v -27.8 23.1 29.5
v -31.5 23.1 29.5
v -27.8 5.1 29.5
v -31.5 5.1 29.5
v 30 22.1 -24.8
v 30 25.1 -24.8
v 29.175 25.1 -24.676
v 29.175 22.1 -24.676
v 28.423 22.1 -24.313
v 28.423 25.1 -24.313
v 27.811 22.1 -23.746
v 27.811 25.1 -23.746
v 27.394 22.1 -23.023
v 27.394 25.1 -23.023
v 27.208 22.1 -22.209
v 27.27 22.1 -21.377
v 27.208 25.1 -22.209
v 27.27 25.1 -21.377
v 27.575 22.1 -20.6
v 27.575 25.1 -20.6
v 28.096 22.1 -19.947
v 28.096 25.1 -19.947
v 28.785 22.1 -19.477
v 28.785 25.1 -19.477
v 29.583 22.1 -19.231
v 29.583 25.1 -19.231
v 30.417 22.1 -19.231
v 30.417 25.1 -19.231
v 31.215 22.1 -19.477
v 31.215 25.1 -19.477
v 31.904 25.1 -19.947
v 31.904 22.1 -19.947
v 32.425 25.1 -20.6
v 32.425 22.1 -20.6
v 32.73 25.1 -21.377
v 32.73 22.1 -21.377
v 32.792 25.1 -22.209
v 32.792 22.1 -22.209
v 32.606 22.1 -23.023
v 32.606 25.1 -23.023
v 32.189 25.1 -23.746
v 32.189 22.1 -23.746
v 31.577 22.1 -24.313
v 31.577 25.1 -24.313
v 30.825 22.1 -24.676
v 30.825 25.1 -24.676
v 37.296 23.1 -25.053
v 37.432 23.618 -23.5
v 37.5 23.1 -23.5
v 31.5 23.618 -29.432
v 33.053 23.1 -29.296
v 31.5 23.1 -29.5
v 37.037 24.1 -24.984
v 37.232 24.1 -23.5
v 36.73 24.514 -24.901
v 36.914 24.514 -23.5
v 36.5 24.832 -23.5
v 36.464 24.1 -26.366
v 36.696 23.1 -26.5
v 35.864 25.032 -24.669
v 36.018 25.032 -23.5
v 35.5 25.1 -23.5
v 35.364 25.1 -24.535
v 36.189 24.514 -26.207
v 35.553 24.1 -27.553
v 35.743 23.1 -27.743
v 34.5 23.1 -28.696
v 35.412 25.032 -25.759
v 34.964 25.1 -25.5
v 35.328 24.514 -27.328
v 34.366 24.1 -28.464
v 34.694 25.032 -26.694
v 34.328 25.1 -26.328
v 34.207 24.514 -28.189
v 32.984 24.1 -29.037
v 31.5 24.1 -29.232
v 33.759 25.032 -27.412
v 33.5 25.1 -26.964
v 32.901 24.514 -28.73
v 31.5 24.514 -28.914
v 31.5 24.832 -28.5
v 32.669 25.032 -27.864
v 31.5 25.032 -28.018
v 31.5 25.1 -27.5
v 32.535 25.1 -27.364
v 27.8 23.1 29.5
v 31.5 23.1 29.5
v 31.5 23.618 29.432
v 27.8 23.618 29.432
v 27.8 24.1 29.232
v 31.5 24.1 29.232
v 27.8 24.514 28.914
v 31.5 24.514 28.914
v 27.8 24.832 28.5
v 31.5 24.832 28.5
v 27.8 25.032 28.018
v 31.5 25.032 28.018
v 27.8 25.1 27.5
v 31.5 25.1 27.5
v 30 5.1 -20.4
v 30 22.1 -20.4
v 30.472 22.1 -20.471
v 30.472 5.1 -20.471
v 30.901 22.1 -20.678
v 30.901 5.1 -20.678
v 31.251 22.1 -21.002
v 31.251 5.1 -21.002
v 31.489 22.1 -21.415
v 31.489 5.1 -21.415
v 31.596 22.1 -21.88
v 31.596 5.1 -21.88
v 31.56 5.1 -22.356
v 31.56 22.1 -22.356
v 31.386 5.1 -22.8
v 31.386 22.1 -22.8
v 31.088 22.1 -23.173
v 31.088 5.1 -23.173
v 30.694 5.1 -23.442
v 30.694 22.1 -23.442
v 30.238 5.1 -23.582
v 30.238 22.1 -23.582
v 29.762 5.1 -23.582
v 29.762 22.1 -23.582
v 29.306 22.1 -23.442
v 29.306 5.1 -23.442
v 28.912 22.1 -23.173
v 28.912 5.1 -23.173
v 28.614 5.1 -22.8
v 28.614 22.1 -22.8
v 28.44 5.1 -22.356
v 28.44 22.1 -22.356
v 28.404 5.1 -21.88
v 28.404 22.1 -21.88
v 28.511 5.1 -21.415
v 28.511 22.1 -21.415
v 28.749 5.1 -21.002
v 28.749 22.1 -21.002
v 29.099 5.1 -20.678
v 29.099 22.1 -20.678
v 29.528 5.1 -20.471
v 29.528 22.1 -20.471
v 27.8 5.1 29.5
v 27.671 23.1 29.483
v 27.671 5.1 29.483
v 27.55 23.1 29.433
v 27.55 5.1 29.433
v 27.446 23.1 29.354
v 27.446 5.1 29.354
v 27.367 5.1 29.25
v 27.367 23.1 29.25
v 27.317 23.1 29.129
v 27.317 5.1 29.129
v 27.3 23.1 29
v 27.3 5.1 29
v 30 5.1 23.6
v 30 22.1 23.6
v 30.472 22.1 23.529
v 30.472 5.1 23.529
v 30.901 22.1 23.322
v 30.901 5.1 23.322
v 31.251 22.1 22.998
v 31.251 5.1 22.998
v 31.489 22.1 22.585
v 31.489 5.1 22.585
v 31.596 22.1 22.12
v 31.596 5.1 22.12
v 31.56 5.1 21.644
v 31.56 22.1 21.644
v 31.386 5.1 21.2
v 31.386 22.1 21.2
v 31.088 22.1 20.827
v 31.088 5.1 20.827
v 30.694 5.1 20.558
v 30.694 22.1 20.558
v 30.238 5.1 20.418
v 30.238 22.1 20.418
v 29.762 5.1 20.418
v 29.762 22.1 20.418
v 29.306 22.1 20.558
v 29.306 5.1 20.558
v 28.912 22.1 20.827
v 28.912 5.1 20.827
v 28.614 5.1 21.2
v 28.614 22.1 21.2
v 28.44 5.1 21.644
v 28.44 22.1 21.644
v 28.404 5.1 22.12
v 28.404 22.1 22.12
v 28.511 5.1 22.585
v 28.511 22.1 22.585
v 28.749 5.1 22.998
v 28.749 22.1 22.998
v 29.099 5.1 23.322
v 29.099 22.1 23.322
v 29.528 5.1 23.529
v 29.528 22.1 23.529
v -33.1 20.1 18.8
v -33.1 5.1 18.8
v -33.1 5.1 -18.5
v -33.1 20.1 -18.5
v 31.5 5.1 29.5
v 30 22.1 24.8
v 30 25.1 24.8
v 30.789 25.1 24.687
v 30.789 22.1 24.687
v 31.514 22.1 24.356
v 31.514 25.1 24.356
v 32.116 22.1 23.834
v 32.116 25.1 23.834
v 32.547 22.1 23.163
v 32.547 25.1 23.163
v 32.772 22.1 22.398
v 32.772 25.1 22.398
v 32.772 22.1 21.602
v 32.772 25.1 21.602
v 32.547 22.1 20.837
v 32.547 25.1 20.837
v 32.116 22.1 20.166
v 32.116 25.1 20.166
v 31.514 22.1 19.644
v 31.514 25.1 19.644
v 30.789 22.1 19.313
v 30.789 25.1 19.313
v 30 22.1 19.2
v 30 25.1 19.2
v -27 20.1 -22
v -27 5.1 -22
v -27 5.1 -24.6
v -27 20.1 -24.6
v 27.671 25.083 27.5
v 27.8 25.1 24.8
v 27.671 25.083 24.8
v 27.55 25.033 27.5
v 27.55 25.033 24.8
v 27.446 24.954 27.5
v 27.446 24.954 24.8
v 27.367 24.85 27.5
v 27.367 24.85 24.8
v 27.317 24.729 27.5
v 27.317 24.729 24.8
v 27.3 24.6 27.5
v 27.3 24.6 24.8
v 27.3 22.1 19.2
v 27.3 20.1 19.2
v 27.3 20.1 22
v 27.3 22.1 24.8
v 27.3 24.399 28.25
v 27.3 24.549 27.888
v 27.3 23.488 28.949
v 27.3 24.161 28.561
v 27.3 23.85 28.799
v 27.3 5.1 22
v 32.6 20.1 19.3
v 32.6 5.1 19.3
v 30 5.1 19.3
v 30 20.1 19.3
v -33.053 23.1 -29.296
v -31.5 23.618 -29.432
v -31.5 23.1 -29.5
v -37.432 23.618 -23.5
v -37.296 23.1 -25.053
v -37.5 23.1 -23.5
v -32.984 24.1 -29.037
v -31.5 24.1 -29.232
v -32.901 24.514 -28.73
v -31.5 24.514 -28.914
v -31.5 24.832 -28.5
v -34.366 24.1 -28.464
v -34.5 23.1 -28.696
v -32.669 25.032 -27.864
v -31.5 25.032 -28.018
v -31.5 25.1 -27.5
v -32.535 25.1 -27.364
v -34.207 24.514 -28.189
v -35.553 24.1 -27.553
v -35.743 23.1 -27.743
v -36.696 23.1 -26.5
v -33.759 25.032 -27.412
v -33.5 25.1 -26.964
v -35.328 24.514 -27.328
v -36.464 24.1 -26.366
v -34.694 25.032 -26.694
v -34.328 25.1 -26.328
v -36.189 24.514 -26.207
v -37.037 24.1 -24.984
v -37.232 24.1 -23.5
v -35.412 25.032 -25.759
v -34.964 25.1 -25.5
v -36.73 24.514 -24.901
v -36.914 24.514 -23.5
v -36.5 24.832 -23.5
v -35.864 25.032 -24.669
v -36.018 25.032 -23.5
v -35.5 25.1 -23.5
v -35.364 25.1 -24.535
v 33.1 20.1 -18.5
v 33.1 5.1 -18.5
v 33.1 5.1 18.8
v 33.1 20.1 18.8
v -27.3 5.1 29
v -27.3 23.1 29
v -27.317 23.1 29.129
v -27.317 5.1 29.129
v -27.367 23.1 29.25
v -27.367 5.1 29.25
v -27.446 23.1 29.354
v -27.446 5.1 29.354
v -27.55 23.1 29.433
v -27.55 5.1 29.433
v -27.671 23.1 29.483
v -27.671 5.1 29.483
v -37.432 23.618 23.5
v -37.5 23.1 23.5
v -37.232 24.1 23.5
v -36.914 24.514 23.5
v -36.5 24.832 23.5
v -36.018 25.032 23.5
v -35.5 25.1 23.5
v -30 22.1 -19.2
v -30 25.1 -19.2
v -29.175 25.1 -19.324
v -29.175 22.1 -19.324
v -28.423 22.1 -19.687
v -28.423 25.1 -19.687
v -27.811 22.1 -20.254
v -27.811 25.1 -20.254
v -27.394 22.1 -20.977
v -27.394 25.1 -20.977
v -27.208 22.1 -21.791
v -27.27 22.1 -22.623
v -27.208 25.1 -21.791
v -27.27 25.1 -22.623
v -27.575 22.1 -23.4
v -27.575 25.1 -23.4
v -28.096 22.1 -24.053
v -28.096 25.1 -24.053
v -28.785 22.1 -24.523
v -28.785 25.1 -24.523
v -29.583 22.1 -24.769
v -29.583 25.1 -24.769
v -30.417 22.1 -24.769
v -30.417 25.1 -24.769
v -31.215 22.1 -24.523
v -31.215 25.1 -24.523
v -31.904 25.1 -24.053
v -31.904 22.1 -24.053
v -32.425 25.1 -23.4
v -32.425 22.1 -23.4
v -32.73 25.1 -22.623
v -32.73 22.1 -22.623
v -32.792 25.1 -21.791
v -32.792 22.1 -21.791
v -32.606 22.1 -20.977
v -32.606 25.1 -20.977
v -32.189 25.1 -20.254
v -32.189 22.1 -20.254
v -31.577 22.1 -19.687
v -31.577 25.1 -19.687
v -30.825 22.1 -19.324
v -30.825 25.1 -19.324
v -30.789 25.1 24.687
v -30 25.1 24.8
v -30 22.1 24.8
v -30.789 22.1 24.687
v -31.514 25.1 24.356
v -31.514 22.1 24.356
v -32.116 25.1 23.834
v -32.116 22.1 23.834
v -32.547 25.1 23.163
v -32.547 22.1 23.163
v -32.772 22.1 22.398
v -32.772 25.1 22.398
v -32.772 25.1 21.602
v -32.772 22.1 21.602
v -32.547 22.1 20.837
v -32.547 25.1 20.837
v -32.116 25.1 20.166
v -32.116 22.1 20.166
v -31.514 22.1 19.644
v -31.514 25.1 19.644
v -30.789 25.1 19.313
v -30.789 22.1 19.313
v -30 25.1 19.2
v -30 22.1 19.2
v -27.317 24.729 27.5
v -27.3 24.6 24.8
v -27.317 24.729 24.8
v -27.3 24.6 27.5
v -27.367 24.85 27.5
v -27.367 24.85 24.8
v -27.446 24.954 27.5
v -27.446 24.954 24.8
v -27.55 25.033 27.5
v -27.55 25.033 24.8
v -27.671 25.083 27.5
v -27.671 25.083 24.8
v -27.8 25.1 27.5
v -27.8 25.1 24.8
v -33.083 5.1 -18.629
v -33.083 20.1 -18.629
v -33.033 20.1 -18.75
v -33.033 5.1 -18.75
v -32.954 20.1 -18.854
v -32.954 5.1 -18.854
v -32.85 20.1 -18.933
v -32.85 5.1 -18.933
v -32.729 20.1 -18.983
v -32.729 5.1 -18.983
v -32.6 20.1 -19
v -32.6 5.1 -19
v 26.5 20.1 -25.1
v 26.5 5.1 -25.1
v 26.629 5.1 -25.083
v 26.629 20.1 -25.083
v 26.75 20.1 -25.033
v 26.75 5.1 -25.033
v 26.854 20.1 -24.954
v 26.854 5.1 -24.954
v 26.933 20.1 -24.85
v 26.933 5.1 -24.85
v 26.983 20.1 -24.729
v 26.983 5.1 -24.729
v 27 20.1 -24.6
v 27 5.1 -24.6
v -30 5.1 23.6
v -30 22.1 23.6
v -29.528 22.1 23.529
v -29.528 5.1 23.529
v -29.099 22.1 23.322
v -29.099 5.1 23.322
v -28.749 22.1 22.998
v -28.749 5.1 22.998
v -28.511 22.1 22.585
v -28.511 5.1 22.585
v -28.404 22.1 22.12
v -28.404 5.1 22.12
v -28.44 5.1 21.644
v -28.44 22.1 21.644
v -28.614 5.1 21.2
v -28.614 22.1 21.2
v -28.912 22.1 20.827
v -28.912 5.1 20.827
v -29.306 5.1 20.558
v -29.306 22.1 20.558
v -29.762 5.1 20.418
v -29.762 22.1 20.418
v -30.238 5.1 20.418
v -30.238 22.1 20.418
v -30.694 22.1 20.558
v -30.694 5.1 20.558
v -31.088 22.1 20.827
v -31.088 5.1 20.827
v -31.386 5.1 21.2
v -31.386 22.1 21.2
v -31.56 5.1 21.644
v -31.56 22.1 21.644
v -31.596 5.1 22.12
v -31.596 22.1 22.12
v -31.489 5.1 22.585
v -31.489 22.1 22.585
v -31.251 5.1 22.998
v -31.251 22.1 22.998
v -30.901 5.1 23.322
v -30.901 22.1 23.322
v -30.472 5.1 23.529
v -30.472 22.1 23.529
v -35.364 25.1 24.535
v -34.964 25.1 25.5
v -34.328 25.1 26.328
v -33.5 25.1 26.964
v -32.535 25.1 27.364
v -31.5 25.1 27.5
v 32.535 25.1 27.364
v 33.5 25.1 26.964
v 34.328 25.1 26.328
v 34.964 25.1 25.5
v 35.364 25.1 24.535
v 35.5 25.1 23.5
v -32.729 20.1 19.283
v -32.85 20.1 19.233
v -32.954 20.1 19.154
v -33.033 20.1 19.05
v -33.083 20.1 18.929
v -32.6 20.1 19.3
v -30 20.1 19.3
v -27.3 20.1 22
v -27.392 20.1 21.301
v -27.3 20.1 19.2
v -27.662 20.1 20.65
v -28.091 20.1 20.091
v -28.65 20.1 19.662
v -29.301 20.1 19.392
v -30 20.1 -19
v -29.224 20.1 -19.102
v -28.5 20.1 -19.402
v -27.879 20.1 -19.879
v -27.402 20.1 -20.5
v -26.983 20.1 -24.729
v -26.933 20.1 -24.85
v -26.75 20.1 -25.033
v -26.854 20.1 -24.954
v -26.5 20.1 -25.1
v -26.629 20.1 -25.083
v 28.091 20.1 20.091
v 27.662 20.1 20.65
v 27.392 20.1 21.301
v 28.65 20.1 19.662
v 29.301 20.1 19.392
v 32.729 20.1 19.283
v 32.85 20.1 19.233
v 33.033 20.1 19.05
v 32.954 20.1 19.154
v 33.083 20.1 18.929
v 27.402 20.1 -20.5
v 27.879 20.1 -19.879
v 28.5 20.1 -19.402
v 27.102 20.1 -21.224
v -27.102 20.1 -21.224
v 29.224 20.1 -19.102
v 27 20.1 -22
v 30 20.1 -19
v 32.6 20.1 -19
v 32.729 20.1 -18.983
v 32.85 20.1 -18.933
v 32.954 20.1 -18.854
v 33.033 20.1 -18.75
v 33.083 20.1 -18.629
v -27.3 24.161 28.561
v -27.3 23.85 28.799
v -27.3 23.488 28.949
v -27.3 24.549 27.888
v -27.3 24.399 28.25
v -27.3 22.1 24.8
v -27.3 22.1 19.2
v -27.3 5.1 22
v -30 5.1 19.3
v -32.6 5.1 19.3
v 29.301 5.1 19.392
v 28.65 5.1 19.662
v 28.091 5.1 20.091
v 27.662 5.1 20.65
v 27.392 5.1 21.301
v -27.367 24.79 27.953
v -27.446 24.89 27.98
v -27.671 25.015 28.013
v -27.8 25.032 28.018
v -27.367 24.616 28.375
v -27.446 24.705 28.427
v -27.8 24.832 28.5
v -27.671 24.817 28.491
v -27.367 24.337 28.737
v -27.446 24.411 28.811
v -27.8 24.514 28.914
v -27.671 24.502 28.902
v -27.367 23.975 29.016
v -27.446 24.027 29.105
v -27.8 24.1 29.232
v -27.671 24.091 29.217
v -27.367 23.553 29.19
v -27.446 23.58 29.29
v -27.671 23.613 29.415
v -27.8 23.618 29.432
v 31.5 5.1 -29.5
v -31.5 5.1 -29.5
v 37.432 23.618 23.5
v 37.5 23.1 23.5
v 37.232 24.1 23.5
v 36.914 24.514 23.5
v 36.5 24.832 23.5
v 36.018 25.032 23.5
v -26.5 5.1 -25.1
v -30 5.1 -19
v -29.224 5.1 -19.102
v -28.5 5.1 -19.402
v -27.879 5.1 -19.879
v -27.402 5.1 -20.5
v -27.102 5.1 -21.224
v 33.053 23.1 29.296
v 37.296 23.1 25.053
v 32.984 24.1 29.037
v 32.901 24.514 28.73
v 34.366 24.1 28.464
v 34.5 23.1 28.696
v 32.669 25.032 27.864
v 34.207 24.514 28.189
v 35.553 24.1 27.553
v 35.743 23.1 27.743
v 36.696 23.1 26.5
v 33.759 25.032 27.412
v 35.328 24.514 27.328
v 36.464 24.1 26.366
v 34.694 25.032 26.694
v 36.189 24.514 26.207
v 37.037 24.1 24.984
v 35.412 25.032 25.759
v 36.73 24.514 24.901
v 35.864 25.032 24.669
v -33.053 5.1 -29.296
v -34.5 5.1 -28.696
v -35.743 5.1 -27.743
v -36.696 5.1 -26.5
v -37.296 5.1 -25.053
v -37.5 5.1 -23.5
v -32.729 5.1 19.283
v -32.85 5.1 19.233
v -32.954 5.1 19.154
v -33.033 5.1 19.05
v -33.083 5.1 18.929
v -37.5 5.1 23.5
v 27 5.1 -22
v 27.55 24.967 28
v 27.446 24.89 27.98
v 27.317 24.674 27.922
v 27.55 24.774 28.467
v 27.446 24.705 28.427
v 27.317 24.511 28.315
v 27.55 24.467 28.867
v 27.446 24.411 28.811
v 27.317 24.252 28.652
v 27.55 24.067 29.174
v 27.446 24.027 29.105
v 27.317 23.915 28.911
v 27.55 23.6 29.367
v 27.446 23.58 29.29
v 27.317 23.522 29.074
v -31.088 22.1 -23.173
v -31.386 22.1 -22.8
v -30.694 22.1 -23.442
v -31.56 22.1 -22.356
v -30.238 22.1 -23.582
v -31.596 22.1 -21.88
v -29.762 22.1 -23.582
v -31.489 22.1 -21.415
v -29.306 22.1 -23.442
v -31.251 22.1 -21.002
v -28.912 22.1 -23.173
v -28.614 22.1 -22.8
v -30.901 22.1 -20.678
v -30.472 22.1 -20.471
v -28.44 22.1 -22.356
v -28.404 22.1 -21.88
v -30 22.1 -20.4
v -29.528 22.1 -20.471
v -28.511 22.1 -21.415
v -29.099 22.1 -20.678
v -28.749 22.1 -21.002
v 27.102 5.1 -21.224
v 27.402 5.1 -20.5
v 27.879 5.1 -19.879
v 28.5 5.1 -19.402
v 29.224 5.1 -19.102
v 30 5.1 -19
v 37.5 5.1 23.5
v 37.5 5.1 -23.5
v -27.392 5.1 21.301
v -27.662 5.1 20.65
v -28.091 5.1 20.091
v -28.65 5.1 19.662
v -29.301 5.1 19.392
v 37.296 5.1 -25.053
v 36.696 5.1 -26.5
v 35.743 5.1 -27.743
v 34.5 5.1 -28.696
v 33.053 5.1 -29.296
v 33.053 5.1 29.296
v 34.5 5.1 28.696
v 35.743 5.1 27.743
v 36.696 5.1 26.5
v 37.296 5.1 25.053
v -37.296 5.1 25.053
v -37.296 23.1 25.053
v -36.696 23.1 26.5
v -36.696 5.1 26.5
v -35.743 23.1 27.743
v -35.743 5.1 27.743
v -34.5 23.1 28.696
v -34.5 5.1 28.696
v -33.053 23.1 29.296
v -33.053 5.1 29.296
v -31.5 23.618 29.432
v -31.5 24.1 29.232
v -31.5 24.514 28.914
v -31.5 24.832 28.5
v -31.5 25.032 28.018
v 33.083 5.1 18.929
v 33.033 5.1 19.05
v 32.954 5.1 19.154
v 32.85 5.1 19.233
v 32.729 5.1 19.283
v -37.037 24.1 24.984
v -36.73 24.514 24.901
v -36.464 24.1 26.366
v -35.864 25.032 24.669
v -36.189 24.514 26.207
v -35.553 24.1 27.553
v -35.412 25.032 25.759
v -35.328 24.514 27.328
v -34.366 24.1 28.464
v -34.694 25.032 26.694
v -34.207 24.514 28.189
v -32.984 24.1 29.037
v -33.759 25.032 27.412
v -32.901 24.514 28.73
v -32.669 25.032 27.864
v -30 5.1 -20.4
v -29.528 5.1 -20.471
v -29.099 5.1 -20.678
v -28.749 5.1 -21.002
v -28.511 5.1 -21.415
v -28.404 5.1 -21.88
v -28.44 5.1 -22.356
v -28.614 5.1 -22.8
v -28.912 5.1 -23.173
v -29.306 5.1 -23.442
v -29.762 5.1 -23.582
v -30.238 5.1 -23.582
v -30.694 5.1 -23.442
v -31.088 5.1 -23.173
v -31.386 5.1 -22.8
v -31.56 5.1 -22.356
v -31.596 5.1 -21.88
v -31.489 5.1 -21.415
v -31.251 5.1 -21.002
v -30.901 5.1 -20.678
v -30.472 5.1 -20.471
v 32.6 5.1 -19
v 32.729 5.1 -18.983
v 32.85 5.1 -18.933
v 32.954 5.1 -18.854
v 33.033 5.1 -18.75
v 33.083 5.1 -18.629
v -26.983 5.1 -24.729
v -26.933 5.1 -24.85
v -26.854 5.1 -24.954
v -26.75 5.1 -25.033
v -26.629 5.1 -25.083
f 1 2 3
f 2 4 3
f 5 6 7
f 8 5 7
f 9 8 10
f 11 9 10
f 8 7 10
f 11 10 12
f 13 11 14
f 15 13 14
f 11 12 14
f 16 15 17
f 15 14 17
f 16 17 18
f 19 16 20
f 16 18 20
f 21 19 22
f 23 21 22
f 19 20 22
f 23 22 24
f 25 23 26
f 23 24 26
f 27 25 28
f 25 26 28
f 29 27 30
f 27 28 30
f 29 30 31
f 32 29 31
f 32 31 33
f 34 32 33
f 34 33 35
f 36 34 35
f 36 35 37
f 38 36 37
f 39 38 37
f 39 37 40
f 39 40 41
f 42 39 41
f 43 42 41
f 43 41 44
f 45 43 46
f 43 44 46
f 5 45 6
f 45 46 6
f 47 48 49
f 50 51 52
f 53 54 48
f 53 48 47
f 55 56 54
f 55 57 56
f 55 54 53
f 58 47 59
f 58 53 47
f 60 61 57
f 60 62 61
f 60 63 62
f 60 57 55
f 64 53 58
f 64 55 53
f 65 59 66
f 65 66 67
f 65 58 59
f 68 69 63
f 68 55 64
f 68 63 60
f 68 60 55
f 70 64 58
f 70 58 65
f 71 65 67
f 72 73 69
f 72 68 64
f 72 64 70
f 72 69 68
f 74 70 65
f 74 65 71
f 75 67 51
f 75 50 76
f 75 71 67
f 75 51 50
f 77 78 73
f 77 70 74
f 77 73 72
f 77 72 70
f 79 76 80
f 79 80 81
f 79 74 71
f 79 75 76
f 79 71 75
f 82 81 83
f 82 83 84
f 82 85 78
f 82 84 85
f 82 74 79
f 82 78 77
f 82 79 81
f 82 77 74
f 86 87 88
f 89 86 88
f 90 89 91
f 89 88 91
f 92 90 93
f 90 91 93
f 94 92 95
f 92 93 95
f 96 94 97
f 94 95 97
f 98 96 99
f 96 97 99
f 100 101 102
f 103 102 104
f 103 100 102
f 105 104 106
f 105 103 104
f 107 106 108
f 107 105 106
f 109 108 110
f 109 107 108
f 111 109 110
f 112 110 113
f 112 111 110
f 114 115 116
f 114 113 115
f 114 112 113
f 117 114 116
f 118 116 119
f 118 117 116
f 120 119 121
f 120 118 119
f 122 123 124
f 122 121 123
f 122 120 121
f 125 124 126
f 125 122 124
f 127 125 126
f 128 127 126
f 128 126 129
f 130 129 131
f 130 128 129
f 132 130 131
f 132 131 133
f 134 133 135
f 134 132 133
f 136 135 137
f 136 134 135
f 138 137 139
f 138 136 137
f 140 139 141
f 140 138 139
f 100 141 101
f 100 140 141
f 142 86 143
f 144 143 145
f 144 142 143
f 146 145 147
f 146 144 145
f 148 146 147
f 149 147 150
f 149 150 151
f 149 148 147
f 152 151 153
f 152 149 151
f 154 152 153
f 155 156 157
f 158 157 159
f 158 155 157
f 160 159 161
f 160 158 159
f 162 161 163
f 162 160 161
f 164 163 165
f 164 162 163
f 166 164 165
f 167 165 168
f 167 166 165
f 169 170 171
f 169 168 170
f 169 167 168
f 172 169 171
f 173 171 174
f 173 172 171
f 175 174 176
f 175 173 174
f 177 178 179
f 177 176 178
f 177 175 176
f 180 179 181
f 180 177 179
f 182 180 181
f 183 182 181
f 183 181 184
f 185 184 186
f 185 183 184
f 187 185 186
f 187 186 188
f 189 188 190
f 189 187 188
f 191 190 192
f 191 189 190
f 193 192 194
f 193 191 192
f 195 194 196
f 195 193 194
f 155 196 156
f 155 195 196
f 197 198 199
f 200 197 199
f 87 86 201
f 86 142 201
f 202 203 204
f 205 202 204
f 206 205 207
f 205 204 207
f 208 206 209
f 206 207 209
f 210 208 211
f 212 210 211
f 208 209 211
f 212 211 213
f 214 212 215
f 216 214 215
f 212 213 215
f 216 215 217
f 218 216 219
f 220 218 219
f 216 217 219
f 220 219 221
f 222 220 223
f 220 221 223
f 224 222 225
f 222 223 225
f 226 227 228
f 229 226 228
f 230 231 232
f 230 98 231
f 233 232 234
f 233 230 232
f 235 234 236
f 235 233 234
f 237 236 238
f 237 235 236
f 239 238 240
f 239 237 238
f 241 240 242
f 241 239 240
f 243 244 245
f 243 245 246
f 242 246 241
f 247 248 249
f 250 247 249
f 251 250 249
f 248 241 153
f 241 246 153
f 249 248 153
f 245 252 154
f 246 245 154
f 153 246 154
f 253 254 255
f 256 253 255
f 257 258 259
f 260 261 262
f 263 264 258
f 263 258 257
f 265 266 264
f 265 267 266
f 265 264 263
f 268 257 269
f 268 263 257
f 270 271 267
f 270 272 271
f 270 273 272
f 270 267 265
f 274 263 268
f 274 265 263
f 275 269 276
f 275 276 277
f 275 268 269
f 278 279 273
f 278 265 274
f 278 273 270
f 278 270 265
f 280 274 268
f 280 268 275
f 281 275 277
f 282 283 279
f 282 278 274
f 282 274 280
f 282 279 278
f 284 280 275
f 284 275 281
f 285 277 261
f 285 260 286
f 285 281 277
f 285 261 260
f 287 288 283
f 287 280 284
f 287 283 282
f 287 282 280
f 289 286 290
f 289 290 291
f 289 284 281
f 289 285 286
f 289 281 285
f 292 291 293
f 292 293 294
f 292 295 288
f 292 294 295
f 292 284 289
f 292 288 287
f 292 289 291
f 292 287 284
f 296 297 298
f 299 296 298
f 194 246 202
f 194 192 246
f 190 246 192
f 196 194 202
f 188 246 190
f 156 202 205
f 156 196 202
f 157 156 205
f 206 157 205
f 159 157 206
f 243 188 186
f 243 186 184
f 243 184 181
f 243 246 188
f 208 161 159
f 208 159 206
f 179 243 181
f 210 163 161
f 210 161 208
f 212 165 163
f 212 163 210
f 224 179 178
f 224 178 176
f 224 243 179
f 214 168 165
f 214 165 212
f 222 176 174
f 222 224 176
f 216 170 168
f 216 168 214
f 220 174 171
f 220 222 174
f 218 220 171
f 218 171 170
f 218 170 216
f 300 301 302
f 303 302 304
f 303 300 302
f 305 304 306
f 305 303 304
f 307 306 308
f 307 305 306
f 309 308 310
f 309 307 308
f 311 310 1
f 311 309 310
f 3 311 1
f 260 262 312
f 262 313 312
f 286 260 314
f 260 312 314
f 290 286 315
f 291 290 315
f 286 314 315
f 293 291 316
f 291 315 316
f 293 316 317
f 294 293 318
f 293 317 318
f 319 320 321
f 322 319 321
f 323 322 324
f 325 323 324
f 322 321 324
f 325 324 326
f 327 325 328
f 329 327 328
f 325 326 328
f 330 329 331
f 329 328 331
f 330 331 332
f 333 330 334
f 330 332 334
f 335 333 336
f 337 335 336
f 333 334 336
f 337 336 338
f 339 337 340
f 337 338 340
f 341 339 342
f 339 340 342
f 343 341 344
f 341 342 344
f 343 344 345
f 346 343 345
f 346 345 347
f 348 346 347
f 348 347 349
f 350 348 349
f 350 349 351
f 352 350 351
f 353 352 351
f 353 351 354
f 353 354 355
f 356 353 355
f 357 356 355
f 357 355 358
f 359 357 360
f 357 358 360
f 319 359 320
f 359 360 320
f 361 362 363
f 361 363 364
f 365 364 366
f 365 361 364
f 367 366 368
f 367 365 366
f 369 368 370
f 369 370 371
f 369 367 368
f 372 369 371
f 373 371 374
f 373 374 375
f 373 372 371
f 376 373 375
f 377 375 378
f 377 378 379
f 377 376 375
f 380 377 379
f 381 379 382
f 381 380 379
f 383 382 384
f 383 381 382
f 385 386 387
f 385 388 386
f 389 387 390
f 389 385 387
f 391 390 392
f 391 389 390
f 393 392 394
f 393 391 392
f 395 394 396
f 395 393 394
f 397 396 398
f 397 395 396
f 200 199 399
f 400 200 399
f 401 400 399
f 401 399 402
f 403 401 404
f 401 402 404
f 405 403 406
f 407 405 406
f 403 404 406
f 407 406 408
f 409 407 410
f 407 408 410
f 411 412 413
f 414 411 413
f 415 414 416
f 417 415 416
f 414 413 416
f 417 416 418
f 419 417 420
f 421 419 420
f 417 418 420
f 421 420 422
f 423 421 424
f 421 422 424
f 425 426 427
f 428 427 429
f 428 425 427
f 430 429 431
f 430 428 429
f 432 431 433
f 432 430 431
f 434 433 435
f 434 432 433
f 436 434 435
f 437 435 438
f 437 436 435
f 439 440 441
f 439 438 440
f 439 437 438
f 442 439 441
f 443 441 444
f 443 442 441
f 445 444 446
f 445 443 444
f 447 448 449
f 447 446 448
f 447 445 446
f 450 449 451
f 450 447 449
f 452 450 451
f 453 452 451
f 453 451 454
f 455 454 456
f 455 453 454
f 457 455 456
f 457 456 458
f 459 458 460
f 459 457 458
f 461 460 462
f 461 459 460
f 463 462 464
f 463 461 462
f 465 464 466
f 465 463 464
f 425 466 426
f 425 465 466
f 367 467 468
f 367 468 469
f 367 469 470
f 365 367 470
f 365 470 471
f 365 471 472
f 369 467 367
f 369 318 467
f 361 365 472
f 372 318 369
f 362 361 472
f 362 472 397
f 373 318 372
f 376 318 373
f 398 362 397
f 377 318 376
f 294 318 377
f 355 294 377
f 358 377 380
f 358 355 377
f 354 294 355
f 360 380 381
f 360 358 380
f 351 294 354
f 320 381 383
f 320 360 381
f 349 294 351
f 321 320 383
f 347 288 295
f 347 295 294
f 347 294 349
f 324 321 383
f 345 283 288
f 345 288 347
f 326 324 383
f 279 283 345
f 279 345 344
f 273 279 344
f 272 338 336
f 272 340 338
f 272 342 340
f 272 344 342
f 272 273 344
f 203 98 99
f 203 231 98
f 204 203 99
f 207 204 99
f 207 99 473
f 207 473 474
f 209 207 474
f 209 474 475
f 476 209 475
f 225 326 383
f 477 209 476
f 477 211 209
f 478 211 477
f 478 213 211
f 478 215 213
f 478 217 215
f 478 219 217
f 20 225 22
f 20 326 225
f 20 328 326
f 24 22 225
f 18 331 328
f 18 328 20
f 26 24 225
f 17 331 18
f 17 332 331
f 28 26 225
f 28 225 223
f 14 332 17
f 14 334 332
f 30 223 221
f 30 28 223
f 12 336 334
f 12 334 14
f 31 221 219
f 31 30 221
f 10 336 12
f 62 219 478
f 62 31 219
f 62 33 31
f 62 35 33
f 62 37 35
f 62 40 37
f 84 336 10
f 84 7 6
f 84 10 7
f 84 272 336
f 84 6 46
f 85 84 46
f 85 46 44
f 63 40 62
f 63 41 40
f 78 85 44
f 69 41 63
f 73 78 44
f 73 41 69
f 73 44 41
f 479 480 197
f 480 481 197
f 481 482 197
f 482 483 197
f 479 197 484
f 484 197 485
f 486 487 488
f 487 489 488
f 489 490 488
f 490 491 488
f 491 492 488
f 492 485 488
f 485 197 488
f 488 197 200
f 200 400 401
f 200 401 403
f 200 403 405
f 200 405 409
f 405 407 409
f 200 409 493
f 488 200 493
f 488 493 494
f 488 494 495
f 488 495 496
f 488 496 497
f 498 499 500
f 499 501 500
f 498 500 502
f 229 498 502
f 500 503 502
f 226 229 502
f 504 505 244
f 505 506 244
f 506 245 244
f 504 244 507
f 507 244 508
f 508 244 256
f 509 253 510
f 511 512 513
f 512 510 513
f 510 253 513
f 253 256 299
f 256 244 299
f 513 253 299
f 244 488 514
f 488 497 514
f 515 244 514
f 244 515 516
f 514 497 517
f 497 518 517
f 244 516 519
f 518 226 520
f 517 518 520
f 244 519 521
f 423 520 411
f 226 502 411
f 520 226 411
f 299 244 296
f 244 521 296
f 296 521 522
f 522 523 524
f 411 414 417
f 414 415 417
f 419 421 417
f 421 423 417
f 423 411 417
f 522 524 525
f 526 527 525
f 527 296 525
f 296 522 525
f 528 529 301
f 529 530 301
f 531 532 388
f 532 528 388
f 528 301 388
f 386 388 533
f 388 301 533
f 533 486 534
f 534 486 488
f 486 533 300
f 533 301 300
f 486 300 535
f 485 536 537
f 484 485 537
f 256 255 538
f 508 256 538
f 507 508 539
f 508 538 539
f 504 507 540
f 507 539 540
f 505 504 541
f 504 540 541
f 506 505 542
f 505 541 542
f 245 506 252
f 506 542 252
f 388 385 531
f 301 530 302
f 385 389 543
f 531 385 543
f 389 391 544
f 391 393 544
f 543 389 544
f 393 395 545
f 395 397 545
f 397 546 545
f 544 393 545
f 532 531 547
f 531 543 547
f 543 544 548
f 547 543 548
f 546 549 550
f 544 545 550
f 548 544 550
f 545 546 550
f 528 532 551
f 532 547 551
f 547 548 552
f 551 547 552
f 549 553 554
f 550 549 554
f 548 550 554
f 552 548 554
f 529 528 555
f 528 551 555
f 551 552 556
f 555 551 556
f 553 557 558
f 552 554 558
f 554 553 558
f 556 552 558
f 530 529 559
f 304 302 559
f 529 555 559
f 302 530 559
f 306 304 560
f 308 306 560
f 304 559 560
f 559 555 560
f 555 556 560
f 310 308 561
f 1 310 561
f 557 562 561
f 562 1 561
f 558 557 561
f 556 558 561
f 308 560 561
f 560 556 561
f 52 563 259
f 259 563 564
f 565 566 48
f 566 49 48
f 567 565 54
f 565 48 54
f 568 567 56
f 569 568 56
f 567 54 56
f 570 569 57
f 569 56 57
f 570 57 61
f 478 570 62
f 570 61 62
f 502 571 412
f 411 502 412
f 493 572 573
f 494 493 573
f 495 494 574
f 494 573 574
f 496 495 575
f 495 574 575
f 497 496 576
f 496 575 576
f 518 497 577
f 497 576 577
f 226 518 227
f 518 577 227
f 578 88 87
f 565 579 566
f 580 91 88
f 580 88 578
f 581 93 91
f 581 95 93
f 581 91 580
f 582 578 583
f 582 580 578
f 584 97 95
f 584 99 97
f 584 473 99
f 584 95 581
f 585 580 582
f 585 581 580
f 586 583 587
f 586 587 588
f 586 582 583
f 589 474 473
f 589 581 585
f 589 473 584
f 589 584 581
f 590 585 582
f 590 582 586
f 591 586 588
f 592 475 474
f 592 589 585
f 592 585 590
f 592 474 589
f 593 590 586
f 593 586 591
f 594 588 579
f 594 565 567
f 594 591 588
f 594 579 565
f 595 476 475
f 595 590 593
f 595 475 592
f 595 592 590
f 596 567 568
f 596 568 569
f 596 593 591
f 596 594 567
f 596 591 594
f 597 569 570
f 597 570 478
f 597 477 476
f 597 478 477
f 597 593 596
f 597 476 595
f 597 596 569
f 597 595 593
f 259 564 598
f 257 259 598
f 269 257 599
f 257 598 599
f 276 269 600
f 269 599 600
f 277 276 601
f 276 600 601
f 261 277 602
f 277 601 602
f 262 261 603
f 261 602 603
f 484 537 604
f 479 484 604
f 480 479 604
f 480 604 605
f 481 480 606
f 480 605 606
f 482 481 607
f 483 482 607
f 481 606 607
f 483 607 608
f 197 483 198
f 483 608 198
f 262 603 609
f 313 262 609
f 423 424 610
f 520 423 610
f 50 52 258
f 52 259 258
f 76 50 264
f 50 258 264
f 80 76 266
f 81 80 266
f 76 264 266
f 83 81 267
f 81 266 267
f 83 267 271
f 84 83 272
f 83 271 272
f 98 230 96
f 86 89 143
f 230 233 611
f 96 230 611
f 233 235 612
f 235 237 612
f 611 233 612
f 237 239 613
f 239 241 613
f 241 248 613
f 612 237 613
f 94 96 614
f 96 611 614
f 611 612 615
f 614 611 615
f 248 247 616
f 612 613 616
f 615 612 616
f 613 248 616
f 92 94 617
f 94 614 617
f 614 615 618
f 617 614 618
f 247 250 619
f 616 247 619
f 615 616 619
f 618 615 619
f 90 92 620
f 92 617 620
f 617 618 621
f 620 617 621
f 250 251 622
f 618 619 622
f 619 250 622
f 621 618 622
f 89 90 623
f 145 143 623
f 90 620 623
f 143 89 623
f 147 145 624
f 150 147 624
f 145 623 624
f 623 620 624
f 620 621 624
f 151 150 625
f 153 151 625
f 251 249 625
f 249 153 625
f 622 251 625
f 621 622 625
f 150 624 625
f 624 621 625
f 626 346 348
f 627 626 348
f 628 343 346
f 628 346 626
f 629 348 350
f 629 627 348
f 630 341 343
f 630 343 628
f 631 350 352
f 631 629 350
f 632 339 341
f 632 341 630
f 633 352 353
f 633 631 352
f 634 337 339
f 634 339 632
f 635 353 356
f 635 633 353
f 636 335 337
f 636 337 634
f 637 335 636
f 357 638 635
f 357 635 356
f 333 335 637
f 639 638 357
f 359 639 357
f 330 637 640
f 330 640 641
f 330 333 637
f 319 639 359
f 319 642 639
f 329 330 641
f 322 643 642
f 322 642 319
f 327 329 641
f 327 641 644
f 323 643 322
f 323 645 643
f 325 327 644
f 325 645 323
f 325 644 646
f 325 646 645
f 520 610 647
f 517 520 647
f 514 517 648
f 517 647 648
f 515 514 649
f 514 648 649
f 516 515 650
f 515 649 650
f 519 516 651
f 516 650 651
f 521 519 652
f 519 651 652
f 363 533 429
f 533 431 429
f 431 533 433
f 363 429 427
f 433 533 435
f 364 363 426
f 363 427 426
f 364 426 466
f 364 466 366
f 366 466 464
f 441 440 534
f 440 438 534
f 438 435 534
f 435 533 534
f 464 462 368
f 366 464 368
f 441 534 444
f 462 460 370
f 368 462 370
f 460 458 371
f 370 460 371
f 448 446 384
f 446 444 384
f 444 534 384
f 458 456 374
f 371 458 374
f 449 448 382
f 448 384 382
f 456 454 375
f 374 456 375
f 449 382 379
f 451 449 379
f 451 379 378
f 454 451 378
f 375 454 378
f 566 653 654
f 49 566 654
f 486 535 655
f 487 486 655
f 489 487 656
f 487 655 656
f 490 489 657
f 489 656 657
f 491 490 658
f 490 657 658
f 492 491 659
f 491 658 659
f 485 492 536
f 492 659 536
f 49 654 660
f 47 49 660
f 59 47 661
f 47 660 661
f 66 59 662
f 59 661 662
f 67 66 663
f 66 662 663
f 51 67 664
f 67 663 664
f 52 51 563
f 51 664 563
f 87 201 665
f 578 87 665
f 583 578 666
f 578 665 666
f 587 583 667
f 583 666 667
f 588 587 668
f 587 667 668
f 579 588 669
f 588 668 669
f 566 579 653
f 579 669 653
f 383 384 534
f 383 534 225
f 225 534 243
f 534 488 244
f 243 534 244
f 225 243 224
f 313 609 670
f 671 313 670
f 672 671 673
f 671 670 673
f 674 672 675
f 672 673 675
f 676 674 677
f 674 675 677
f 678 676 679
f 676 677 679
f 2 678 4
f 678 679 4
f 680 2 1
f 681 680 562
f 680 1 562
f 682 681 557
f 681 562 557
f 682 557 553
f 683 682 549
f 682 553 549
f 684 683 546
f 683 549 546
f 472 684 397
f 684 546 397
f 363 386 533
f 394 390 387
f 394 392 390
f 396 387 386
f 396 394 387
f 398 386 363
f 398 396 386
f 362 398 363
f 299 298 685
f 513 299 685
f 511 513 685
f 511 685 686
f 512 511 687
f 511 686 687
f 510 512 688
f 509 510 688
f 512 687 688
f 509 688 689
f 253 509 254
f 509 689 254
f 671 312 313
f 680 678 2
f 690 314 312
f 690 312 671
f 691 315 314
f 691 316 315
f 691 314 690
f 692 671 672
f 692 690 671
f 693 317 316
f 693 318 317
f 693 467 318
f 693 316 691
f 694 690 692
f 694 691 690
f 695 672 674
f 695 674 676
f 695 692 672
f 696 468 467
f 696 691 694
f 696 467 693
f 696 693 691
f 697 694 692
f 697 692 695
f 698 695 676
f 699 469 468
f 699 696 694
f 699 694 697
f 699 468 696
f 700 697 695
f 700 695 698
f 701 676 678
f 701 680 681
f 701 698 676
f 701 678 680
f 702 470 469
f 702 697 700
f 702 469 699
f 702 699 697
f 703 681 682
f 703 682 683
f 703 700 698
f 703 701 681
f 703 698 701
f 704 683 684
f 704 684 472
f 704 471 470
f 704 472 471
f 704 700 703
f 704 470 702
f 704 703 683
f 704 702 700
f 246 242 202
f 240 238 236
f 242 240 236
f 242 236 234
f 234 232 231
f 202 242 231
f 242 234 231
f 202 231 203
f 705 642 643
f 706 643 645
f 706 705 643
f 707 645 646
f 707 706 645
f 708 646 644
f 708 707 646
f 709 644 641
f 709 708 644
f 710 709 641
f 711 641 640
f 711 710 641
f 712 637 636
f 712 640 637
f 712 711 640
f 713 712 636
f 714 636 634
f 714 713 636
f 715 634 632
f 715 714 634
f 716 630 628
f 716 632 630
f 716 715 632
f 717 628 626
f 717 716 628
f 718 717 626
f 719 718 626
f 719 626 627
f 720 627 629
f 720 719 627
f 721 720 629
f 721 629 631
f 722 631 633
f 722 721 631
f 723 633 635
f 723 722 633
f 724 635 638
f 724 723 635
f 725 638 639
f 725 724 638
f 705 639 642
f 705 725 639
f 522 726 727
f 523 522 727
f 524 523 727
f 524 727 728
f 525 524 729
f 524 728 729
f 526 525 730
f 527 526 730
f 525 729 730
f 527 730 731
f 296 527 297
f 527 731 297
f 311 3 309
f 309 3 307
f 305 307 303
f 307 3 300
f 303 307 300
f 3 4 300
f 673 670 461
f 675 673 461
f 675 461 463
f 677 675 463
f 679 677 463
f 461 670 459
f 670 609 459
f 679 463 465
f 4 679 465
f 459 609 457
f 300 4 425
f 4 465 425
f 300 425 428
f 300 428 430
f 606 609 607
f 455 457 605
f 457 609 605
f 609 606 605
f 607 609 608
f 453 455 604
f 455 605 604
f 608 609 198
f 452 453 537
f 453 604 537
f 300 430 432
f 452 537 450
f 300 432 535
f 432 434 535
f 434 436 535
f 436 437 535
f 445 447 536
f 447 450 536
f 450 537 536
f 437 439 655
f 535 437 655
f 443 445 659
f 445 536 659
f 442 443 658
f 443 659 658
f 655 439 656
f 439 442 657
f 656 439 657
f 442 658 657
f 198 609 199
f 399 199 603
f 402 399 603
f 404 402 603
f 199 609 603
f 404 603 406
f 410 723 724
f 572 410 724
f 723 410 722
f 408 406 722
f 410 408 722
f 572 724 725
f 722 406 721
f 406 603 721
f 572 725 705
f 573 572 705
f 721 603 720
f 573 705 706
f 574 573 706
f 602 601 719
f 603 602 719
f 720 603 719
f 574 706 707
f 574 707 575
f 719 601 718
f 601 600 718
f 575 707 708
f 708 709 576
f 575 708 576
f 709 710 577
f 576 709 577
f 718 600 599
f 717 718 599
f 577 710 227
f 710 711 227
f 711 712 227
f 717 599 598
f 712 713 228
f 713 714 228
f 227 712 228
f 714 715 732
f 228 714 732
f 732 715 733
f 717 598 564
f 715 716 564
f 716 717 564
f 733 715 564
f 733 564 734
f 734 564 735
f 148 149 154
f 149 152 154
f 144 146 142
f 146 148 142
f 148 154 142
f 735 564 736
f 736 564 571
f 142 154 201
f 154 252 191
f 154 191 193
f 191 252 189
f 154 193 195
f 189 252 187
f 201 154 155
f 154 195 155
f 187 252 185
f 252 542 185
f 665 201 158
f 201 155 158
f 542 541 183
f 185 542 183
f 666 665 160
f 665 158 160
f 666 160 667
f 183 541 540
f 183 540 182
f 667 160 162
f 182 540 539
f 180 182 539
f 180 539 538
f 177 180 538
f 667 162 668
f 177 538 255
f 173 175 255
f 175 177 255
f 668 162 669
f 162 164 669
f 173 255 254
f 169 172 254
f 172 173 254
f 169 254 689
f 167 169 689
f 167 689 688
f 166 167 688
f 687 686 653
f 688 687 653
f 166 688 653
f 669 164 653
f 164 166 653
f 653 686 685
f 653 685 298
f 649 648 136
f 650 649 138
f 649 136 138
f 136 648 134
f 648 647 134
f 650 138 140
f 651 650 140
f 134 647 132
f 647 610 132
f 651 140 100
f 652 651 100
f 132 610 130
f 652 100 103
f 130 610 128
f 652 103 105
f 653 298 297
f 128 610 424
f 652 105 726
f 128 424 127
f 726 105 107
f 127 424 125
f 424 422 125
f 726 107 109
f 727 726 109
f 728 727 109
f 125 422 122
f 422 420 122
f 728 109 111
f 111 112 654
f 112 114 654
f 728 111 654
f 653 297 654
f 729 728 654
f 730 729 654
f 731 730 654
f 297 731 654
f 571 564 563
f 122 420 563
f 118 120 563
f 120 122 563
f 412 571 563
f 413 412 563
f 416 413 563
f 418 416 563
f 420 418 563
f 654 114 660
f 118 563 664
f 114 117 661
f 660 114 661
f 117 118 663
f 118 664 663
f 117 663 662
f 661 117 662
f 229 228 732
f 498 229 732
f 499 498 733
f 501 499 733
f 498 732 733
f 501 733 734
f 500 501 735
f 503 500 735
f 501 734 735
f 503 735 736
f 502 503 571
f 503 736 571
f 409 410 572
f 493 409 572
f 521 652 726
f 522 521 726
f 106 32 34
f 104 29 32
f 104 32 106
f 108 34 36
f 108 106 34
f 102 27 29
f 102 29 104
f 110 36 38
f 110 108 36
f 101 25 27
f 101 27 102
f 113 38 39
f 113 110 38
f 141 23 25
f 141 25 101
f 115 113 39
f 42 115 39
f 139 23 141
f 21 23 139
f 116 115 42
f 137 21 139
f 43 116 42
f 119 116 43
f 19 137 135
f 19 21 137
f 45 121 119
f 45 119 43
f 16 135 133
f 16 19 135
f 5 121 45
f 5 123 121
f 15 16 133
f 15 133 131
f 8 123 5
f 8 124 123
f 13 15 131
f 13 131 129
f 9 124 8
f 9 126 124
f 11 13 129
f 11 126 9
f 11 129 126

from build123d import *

# Parameters (mm, degrees)
SKETCH2_R           = 1.6
BOSS_EXTRUDE1_DEPTH = 15
SKETCH3_R           = 1.6
BOSS_EXTRUDE2_DEPTH = 5
SKETCH4_R           = 2.8
CUT_EXTRUDE1_DEPTH  = 3
FILLET3_R           = 2
FILLET4_R           = 0.5


with BuildPart() as part:
    # Sketch2 → Boss-Extrude1 (new body)
    # profile 1 of 5: a face of its own
    with BuildSketch(Plane(origin=(0, 5.1, 0), x_dir=(1, 0, 0), z_dir=(0, 1, 0))):
        with BuildLine():
            Line((-27.3, -29.5), (-27.3, -25.1))
            Line((-27.3, -25.1), (-30.1, -25.1))
            ThreePointArc((-30.1, -25.1), (-32.221320344, -24.221320344), (-33.1, -22.1))
            Line((-33.1, -22.1), (-33.1, -18.8))
            Line((-33.1, -18.8), (-33.1, 18.5))
            Line((-33.1, 18.5), (-33.1, 22.1))
            ThreePointArc((-33.1, 22.1), (-32.221320344, 24.221320344), (-30.1, 25.1))
            Line((-30.1, 25.1), (-26.5, 25.1))
            Line((-26.5, 25.1), (26.5, 25.1))
            Line((26.5, 25.1), (30.1, 25.1))
            ThreePointArc((30.1, 25.1), (32.221320344, 24.221320344), (33.1, 22.1))
            Line((33.1, 22.1), (33.1, 18.5))
            Line((33.1, 18.5), (33.1, -18.8))
            Line((33.1, -18.8), (33.1, -22.1))
            ThreePointArc((33.1, -22.1), (32.221320344, -24.221320344), (30.1, -25.1))
            Line((30.1, -25.1), (27.3, -25.1))
            Line((27.3, -25.1), (27.3, -29.5))
            Line((27.3, -29.5), (31.5, -29.5))
            ThreePointArc((31.5, -29.5), (35.742640687, -27.742640687), (37.5, -23.5))
            Line((37.5, -23.5), (37.5, 23.5))
            ThreePointArc((37.5, 23.5), (35.742640687, 27.742640687), (31.5, 29.5))
            Line((31.5, 29.5), (-31.5, 29.5))
            ThreePointArc((-31.5, 29.5), (-35.742640687, 27.742640687), (-37.5, 23.5))
            Line((-37.5, 23.5), (-37.5, -23.5))
            ThreePointArc((-37.5, -23.5), (-35.742640687, -27.742640687), (-31.5, -29.5))
            Line((-31.5, -29.5), (-27.3, -29.5))
        make_face()
    # profile 2 of 5: a face of its own
    with BuildSketch(Plane(origin=(0, 5.1, 0), x_dir=(1, 0, 0), z_dir=(0, 1, 0))):
        with BuildLine():
            Line((-33.1, 22.1), (-33.1, 18.5))
            ThreePointArc((-33.1, 18.5), (-32.953553391, 18.853553391), (-32.6, 19))
            Line((-32.6, 19), (-30, 19))
            ThreePointArc((-30, 19), (-27.878679656, 19.878679656), (-27, 22))
            Line((-27, 22), (-27, 24.6))
            ThreePointArc((-27, 24.6), (-26.853553391, 24.953553391), (-26.5, 25.1))
            Line((-26.5, 25.1), (-30.1, 25.1))
            ThreePointArc((-30.1, 25.1), (-32.221320344, 24.221320344), (-33.1, 22.1))
        make_face()
        with Locations(Location((-30, 22, 0), (0, 0, 270))):
            Circle(SKETCH2_R, mode=Mode.SUBTRACT)
    # profile 3 of 5: a face of its own
    with BuildSketch(Plane(origin=(0, 5.1, 0), x_dir=(1, 0, 0), z_dir=(0, 1, 0))):
        with BuildLine():
            ThreePointArc((32.6, 19), (32.953553391, 18.853553391), (33.1, 18.5))
            Line((33.1, 18.5), (33.1, 22.1))
            ThreePointArc((33.1, 22.1), (32.221320344, 24.221320344), (30.1, 25.1))
            Line((30.1, 25.1), (26.5, 25.1))
            ThreePointArc((26.5, 25.1), (26.853553391, 24.953553391), (27, 24.6))
            Line((27, 24.6), (27, 22))
            ThreePointArc((27, 22), (27.878679656, 19.878679656), (30, 19))
            Line((30, 19), (32.6, 19))
        make_face()
        with Locations(Location((30, 22, 0), (0, 0, 270))):
            Circle(SKETCH2_R, mode=Mode.SUBTRACT)
    # profile 4 of 5: a face of its own
    with BuildSketch(Plane(origin=(0, 5.1, 0), x_dir=(1, 0, 0), z_dir=(0, 1, 0))):
        with BuildLine():
            Line((27.3, -22), (27.3, -25.1))
            Line((27.3, -25.1), (30.1, -25.1))
            ThreePointArc((30.1, -25.1), (32.221320344, -24.221320344), (33.1, -22.1))
            Line((33.1, -22.1), (33.1, -18.8))
            ThreePointArc((33.1, -18.8), (32.953553391, -19.153553391), (32.6, -19.3))
            Line((32.6, -19.3), (30, -19.3))
            ThreePointArc((30, -19.3), (28.090811691, -20.090811691), (27.3, -22))
        make_face()
        with Locations(Location((30, -22, 0), (0, 0, 270))):
            Circle(SKETCH2_R, mode=Mode.SUBTRACT)
    # profile 5 of 5: a face of its own
    with BuildSketch(Plane(origin=(0, 5.1, 0), x_dir=(1, 0, 0), z_dir=(0, 1, 0))):
        with BuildLine():
            Line((-27.3, -25.1), (-27.3, -22))
            ThreePointArc((-27.3, -22), (-28.090811691, -20.090811691), (-30, -19.3))
            Line((-30, -19.3), (-32.6, -19.3))
            ThreePointArc((-32.6, -19.3), (-32.953553391, -19.153553391), (-33.1, -18.8))
            Line((-33.1, -18.8), (-33.1, -22.1))
            ThreePointArc((-33.1, -22.1), (-32.221320344, -24.221320344), (-30.1, -25.1))
            Line((-30.1, -25.1), (-27.3, -25.1))
        make_face()
        with Locations(Location((-30, -22, 0), (0, 0, 270))):
            Circle(SKETCH2_R, mode=Mode.SUBTRACT)
    extrude(amount=BOSS_EXTRUDE1_DEPTH)

    # Sketch3 → Boss-Extrude2 (add)
    # profile 1 of 2: a face of its own
    with BuildSketch(Plane(origin=(0, 20.1, 0), x_dir=(1, 0, 0), z_dir=(0, 1, 0))):
        with BuildLine():
            ThreePointArc((-30, -19.3), (-28.090811691, -20.090811691), (-27.3, -22))
            Line((-27.3, -22), (-27.3, -19.2))
            Line((-27.3, -19.2), (27.3, -19.2))
            Line((27.3, -19.2), (27.3, -22))
            ThreePointArc((27.3, -22), (28.090811691, -20.090811691), (30, -19.3))
            Line((30, -19.3), (32.6, -19.3))
            ThreePointArc((32.6, -19.3), (32.953553391, -19.153553391), (33.1, -18.8))
            Line((33.1, -18.8), (33.1, 18.5))
            ThreePointArc((33.1, 18.5), (32.953553391, 18.853553391), (32.6, 19))
            Line((32.6, 19), (30, 19))
            ThreePointArc((30, 19), (27.878679656, 19.878679656), (27, 22))
            Line((27, 22), (27, 24.6))
            ThreePointArc((27, 24.6), (26.853553391, 24.953553391), (26.5, 25.1))
            Line((26.5, 25.1), (-26.5, 25.1))
            ThreePointArc((-26.5, 25.1), (-26.853553391, 24.953553391), (-27, 24.6))
            Line((-27, 24.6), (-27, 22))
            ThreePointArc((-27, 22), (-27.878679656, 19.878679656), (-30, 19))
            Line((-30, 19), (-32.6, 19))
            ThreePointArc((-32.6, 19), (-32.953553391, 18.853553391), (-33.1, 18.5))
            Line((-33.1, 18.5), (-33.1, -18.8))
            ThreePointArc((-33.1, -18.8), (-32.953553391, -19.153553391), (-32.6, -19.3))
            Line((-32.6, -19.3), (-30, -19.3))
        make_face()
    # profile 2 of 2: a face of its own
    with BuildSketch(Plane(origin=(0, 20.1, 0), x_dir=(1, 0, 0), z_dir=(0, 1, 0))):
        with BuildLine():
            Line((32.6, -19.3), (30, -19.3))
            ThreePointArc((30, -19.3), (28.090811691, -20.090811691), (27.3, -22))
            Line((27.3, -22), (27.3, -29.5))
            Line((27.3, -29.5), (31.5, -29.5))
            ThreePointArc((31.5, -29.5), (35.742640687, -27.742640687), (37.5, -23.5))
            Line((37.5, -23.5), (37.5, 23.5))
            ThreePointArc((37.5, 23.5), (35.742640687, 27.742640687), (31.5, 29.5))
            Line((31.5, 29.5), (-31.5, 29.5))
            ThreePointArc((-31.5, 29.5), (-35.742640687, 27.742640687), (-37.5, 23.5))
            Line((-37.5, 23.5), (-37.5, -23.5))
            ThreePointArc((-37.5, -23.5), (-35.742640687, -27.742640687), (-31.5, -29.5))
            Line((-31.5, -29.5), (-27.3, -29.5))
            Line((-27.3, -29.5), (-27.3, -22))
            ThreePointArc((-27.3, -22), (-28.090811691, -20.090811691), (-30, -19.3))
            Line((-30, -19.3), (-32.6, -19.3))
            ThreePointArc((-32.6, -19.3), (-32.953553391, -19.153553391), (-33.1, -18.8))
            Line((-33.1, -18.8), (-33.1, 18.5))
            ThreePointArc((-33.1, 18.5), (-32.953553391, 18.853553391), (-32.6, 19))
            Line((-32.6, 19), (-30, 19))
            ThreePointArc((-30, 19), (-27.878679656, 19.878679656), (-27, 22))
            Line((-27, 22), (-27, 24.6))
            ThreePointArc((-27, 24.6), (-26.853553391, 24.953553391), (-26.5, 25.1))
            Line((-26.5, 25.1), (26.5, 25.1))
            ThreePointArc((26.5, 25.1), (26.853553391, 24.953553391), (27, 24.6))
            Line((27, 24.6), (27, 22))
            ThreePointArc((27, 22), (27.878679656, 19.878679656), (30, 19))
            Line((30, 19), (32.6, 19))
            ThreePointArc((32.6, 19), (32.953553391, 18.853553391), (33.1, 18.5))
            Line((33.1, 18.5), (33.1, -18.8))
            ThreePointArc((33.1, -18.8), (32.953553391, -19.153553391), (32.6, -19.3))
        make_face()
        with Locations(Location((30, -22, 0), (0, 0, 270))):
            Circle(SKETCH3_R, mode=Mode.SUBTRACT)
        with Locations(Location((-30, 22, 0), (0, 0, 270))):
            Circle(SKETCH3_R, mode=Mode.SUBTRACT)
        with Locations(Location((-30, -22, 0), (0, 0, 270))):
            Circle(SKETCH3_R, mode=Mode.SUBTRACT)
        with Locations(Location((30, 22, 0), (0, 0, 270))):
            Circle(SKETCH3_R, mode=Mode.SUBTRACT)
    extrude(amount=BOSS_EXTRUDE2_DEPTH)

    # Sketch4 → Cut-Extrude1 (cut)
    with BuildSketch(Plane(origin=(0, 25.1, 0), x_dir=(1, 0, 0), z_dir=(0, 1, 0))):
        with Locations(Location((-30, 22, 0), (0, 0, 270))):
            Circle(SKETCH4_R)
        with Locations(Location((30, 22, 0), (0, 0, 90))):
            Circle(SKETCH4_R)
        with BuildLine():
            Line((-30, -19.2), (-27.3, -19.2))
            Line((-27.3, -19.2), (-27.3, -24.8))
            Line((-27.3, -24.8), (-30, -24.8))
            ThreePointArc((-30, -24.8), (-32.8, -22), (-30, -19.2))
        make_face()
        with BuildLine():
            Line((27.3, -19.2), (27.3, -24.8))
            Line((27.3, -24.8), (30, -24.8))
            ThreePointArc((30, -24.8), (32.8, -22), (30, -19.2))
            Line((30, -19.2), (27.3, -19.2))
        make_face()
    extrude(amount=-CUT_EXTRUDE1_DEPTH, mode=Mode.SUBTRACT)

    # Fillet3
    fillet3_edges = [part.edges().sort_by_distance(p)[0] for p in [
        (29.4, 25.1, 29.5),
        (35.742640687, 25.1, 27.742640687),
        (37.5, 25.1, 0),
        (35.742640687, 25.1, -27.742640687),
        (0, 25.1, -29.5),
        (-35.742640687, 25.1, -27.742640687),
        (-37.5, 25.1, 0),
        (-35.742640687, 25.1, 27.742640687),
        (-29.4, 25.1, 29.5),
    ]]
    fillet(fillet3_edges, radius=FILLET3_R)

    # Fillet4
    fillet4_edges = [part.edges().sort_by_distance(p)[0] for p in [
        (27.3, 25.1, 26.15),
        (-27.3, 25.1, 26.15),
        (27.3, 14.1, 29.5),
        (27.3, 24.514213562, 28.914213562),
        (-27.3, 14.1, 29.5),
        (-27.3, 24.514213562, 28.914213562),
    ]]
    fillet(fillet4_edges, radius=FILLET4_R)


solid = part.part
